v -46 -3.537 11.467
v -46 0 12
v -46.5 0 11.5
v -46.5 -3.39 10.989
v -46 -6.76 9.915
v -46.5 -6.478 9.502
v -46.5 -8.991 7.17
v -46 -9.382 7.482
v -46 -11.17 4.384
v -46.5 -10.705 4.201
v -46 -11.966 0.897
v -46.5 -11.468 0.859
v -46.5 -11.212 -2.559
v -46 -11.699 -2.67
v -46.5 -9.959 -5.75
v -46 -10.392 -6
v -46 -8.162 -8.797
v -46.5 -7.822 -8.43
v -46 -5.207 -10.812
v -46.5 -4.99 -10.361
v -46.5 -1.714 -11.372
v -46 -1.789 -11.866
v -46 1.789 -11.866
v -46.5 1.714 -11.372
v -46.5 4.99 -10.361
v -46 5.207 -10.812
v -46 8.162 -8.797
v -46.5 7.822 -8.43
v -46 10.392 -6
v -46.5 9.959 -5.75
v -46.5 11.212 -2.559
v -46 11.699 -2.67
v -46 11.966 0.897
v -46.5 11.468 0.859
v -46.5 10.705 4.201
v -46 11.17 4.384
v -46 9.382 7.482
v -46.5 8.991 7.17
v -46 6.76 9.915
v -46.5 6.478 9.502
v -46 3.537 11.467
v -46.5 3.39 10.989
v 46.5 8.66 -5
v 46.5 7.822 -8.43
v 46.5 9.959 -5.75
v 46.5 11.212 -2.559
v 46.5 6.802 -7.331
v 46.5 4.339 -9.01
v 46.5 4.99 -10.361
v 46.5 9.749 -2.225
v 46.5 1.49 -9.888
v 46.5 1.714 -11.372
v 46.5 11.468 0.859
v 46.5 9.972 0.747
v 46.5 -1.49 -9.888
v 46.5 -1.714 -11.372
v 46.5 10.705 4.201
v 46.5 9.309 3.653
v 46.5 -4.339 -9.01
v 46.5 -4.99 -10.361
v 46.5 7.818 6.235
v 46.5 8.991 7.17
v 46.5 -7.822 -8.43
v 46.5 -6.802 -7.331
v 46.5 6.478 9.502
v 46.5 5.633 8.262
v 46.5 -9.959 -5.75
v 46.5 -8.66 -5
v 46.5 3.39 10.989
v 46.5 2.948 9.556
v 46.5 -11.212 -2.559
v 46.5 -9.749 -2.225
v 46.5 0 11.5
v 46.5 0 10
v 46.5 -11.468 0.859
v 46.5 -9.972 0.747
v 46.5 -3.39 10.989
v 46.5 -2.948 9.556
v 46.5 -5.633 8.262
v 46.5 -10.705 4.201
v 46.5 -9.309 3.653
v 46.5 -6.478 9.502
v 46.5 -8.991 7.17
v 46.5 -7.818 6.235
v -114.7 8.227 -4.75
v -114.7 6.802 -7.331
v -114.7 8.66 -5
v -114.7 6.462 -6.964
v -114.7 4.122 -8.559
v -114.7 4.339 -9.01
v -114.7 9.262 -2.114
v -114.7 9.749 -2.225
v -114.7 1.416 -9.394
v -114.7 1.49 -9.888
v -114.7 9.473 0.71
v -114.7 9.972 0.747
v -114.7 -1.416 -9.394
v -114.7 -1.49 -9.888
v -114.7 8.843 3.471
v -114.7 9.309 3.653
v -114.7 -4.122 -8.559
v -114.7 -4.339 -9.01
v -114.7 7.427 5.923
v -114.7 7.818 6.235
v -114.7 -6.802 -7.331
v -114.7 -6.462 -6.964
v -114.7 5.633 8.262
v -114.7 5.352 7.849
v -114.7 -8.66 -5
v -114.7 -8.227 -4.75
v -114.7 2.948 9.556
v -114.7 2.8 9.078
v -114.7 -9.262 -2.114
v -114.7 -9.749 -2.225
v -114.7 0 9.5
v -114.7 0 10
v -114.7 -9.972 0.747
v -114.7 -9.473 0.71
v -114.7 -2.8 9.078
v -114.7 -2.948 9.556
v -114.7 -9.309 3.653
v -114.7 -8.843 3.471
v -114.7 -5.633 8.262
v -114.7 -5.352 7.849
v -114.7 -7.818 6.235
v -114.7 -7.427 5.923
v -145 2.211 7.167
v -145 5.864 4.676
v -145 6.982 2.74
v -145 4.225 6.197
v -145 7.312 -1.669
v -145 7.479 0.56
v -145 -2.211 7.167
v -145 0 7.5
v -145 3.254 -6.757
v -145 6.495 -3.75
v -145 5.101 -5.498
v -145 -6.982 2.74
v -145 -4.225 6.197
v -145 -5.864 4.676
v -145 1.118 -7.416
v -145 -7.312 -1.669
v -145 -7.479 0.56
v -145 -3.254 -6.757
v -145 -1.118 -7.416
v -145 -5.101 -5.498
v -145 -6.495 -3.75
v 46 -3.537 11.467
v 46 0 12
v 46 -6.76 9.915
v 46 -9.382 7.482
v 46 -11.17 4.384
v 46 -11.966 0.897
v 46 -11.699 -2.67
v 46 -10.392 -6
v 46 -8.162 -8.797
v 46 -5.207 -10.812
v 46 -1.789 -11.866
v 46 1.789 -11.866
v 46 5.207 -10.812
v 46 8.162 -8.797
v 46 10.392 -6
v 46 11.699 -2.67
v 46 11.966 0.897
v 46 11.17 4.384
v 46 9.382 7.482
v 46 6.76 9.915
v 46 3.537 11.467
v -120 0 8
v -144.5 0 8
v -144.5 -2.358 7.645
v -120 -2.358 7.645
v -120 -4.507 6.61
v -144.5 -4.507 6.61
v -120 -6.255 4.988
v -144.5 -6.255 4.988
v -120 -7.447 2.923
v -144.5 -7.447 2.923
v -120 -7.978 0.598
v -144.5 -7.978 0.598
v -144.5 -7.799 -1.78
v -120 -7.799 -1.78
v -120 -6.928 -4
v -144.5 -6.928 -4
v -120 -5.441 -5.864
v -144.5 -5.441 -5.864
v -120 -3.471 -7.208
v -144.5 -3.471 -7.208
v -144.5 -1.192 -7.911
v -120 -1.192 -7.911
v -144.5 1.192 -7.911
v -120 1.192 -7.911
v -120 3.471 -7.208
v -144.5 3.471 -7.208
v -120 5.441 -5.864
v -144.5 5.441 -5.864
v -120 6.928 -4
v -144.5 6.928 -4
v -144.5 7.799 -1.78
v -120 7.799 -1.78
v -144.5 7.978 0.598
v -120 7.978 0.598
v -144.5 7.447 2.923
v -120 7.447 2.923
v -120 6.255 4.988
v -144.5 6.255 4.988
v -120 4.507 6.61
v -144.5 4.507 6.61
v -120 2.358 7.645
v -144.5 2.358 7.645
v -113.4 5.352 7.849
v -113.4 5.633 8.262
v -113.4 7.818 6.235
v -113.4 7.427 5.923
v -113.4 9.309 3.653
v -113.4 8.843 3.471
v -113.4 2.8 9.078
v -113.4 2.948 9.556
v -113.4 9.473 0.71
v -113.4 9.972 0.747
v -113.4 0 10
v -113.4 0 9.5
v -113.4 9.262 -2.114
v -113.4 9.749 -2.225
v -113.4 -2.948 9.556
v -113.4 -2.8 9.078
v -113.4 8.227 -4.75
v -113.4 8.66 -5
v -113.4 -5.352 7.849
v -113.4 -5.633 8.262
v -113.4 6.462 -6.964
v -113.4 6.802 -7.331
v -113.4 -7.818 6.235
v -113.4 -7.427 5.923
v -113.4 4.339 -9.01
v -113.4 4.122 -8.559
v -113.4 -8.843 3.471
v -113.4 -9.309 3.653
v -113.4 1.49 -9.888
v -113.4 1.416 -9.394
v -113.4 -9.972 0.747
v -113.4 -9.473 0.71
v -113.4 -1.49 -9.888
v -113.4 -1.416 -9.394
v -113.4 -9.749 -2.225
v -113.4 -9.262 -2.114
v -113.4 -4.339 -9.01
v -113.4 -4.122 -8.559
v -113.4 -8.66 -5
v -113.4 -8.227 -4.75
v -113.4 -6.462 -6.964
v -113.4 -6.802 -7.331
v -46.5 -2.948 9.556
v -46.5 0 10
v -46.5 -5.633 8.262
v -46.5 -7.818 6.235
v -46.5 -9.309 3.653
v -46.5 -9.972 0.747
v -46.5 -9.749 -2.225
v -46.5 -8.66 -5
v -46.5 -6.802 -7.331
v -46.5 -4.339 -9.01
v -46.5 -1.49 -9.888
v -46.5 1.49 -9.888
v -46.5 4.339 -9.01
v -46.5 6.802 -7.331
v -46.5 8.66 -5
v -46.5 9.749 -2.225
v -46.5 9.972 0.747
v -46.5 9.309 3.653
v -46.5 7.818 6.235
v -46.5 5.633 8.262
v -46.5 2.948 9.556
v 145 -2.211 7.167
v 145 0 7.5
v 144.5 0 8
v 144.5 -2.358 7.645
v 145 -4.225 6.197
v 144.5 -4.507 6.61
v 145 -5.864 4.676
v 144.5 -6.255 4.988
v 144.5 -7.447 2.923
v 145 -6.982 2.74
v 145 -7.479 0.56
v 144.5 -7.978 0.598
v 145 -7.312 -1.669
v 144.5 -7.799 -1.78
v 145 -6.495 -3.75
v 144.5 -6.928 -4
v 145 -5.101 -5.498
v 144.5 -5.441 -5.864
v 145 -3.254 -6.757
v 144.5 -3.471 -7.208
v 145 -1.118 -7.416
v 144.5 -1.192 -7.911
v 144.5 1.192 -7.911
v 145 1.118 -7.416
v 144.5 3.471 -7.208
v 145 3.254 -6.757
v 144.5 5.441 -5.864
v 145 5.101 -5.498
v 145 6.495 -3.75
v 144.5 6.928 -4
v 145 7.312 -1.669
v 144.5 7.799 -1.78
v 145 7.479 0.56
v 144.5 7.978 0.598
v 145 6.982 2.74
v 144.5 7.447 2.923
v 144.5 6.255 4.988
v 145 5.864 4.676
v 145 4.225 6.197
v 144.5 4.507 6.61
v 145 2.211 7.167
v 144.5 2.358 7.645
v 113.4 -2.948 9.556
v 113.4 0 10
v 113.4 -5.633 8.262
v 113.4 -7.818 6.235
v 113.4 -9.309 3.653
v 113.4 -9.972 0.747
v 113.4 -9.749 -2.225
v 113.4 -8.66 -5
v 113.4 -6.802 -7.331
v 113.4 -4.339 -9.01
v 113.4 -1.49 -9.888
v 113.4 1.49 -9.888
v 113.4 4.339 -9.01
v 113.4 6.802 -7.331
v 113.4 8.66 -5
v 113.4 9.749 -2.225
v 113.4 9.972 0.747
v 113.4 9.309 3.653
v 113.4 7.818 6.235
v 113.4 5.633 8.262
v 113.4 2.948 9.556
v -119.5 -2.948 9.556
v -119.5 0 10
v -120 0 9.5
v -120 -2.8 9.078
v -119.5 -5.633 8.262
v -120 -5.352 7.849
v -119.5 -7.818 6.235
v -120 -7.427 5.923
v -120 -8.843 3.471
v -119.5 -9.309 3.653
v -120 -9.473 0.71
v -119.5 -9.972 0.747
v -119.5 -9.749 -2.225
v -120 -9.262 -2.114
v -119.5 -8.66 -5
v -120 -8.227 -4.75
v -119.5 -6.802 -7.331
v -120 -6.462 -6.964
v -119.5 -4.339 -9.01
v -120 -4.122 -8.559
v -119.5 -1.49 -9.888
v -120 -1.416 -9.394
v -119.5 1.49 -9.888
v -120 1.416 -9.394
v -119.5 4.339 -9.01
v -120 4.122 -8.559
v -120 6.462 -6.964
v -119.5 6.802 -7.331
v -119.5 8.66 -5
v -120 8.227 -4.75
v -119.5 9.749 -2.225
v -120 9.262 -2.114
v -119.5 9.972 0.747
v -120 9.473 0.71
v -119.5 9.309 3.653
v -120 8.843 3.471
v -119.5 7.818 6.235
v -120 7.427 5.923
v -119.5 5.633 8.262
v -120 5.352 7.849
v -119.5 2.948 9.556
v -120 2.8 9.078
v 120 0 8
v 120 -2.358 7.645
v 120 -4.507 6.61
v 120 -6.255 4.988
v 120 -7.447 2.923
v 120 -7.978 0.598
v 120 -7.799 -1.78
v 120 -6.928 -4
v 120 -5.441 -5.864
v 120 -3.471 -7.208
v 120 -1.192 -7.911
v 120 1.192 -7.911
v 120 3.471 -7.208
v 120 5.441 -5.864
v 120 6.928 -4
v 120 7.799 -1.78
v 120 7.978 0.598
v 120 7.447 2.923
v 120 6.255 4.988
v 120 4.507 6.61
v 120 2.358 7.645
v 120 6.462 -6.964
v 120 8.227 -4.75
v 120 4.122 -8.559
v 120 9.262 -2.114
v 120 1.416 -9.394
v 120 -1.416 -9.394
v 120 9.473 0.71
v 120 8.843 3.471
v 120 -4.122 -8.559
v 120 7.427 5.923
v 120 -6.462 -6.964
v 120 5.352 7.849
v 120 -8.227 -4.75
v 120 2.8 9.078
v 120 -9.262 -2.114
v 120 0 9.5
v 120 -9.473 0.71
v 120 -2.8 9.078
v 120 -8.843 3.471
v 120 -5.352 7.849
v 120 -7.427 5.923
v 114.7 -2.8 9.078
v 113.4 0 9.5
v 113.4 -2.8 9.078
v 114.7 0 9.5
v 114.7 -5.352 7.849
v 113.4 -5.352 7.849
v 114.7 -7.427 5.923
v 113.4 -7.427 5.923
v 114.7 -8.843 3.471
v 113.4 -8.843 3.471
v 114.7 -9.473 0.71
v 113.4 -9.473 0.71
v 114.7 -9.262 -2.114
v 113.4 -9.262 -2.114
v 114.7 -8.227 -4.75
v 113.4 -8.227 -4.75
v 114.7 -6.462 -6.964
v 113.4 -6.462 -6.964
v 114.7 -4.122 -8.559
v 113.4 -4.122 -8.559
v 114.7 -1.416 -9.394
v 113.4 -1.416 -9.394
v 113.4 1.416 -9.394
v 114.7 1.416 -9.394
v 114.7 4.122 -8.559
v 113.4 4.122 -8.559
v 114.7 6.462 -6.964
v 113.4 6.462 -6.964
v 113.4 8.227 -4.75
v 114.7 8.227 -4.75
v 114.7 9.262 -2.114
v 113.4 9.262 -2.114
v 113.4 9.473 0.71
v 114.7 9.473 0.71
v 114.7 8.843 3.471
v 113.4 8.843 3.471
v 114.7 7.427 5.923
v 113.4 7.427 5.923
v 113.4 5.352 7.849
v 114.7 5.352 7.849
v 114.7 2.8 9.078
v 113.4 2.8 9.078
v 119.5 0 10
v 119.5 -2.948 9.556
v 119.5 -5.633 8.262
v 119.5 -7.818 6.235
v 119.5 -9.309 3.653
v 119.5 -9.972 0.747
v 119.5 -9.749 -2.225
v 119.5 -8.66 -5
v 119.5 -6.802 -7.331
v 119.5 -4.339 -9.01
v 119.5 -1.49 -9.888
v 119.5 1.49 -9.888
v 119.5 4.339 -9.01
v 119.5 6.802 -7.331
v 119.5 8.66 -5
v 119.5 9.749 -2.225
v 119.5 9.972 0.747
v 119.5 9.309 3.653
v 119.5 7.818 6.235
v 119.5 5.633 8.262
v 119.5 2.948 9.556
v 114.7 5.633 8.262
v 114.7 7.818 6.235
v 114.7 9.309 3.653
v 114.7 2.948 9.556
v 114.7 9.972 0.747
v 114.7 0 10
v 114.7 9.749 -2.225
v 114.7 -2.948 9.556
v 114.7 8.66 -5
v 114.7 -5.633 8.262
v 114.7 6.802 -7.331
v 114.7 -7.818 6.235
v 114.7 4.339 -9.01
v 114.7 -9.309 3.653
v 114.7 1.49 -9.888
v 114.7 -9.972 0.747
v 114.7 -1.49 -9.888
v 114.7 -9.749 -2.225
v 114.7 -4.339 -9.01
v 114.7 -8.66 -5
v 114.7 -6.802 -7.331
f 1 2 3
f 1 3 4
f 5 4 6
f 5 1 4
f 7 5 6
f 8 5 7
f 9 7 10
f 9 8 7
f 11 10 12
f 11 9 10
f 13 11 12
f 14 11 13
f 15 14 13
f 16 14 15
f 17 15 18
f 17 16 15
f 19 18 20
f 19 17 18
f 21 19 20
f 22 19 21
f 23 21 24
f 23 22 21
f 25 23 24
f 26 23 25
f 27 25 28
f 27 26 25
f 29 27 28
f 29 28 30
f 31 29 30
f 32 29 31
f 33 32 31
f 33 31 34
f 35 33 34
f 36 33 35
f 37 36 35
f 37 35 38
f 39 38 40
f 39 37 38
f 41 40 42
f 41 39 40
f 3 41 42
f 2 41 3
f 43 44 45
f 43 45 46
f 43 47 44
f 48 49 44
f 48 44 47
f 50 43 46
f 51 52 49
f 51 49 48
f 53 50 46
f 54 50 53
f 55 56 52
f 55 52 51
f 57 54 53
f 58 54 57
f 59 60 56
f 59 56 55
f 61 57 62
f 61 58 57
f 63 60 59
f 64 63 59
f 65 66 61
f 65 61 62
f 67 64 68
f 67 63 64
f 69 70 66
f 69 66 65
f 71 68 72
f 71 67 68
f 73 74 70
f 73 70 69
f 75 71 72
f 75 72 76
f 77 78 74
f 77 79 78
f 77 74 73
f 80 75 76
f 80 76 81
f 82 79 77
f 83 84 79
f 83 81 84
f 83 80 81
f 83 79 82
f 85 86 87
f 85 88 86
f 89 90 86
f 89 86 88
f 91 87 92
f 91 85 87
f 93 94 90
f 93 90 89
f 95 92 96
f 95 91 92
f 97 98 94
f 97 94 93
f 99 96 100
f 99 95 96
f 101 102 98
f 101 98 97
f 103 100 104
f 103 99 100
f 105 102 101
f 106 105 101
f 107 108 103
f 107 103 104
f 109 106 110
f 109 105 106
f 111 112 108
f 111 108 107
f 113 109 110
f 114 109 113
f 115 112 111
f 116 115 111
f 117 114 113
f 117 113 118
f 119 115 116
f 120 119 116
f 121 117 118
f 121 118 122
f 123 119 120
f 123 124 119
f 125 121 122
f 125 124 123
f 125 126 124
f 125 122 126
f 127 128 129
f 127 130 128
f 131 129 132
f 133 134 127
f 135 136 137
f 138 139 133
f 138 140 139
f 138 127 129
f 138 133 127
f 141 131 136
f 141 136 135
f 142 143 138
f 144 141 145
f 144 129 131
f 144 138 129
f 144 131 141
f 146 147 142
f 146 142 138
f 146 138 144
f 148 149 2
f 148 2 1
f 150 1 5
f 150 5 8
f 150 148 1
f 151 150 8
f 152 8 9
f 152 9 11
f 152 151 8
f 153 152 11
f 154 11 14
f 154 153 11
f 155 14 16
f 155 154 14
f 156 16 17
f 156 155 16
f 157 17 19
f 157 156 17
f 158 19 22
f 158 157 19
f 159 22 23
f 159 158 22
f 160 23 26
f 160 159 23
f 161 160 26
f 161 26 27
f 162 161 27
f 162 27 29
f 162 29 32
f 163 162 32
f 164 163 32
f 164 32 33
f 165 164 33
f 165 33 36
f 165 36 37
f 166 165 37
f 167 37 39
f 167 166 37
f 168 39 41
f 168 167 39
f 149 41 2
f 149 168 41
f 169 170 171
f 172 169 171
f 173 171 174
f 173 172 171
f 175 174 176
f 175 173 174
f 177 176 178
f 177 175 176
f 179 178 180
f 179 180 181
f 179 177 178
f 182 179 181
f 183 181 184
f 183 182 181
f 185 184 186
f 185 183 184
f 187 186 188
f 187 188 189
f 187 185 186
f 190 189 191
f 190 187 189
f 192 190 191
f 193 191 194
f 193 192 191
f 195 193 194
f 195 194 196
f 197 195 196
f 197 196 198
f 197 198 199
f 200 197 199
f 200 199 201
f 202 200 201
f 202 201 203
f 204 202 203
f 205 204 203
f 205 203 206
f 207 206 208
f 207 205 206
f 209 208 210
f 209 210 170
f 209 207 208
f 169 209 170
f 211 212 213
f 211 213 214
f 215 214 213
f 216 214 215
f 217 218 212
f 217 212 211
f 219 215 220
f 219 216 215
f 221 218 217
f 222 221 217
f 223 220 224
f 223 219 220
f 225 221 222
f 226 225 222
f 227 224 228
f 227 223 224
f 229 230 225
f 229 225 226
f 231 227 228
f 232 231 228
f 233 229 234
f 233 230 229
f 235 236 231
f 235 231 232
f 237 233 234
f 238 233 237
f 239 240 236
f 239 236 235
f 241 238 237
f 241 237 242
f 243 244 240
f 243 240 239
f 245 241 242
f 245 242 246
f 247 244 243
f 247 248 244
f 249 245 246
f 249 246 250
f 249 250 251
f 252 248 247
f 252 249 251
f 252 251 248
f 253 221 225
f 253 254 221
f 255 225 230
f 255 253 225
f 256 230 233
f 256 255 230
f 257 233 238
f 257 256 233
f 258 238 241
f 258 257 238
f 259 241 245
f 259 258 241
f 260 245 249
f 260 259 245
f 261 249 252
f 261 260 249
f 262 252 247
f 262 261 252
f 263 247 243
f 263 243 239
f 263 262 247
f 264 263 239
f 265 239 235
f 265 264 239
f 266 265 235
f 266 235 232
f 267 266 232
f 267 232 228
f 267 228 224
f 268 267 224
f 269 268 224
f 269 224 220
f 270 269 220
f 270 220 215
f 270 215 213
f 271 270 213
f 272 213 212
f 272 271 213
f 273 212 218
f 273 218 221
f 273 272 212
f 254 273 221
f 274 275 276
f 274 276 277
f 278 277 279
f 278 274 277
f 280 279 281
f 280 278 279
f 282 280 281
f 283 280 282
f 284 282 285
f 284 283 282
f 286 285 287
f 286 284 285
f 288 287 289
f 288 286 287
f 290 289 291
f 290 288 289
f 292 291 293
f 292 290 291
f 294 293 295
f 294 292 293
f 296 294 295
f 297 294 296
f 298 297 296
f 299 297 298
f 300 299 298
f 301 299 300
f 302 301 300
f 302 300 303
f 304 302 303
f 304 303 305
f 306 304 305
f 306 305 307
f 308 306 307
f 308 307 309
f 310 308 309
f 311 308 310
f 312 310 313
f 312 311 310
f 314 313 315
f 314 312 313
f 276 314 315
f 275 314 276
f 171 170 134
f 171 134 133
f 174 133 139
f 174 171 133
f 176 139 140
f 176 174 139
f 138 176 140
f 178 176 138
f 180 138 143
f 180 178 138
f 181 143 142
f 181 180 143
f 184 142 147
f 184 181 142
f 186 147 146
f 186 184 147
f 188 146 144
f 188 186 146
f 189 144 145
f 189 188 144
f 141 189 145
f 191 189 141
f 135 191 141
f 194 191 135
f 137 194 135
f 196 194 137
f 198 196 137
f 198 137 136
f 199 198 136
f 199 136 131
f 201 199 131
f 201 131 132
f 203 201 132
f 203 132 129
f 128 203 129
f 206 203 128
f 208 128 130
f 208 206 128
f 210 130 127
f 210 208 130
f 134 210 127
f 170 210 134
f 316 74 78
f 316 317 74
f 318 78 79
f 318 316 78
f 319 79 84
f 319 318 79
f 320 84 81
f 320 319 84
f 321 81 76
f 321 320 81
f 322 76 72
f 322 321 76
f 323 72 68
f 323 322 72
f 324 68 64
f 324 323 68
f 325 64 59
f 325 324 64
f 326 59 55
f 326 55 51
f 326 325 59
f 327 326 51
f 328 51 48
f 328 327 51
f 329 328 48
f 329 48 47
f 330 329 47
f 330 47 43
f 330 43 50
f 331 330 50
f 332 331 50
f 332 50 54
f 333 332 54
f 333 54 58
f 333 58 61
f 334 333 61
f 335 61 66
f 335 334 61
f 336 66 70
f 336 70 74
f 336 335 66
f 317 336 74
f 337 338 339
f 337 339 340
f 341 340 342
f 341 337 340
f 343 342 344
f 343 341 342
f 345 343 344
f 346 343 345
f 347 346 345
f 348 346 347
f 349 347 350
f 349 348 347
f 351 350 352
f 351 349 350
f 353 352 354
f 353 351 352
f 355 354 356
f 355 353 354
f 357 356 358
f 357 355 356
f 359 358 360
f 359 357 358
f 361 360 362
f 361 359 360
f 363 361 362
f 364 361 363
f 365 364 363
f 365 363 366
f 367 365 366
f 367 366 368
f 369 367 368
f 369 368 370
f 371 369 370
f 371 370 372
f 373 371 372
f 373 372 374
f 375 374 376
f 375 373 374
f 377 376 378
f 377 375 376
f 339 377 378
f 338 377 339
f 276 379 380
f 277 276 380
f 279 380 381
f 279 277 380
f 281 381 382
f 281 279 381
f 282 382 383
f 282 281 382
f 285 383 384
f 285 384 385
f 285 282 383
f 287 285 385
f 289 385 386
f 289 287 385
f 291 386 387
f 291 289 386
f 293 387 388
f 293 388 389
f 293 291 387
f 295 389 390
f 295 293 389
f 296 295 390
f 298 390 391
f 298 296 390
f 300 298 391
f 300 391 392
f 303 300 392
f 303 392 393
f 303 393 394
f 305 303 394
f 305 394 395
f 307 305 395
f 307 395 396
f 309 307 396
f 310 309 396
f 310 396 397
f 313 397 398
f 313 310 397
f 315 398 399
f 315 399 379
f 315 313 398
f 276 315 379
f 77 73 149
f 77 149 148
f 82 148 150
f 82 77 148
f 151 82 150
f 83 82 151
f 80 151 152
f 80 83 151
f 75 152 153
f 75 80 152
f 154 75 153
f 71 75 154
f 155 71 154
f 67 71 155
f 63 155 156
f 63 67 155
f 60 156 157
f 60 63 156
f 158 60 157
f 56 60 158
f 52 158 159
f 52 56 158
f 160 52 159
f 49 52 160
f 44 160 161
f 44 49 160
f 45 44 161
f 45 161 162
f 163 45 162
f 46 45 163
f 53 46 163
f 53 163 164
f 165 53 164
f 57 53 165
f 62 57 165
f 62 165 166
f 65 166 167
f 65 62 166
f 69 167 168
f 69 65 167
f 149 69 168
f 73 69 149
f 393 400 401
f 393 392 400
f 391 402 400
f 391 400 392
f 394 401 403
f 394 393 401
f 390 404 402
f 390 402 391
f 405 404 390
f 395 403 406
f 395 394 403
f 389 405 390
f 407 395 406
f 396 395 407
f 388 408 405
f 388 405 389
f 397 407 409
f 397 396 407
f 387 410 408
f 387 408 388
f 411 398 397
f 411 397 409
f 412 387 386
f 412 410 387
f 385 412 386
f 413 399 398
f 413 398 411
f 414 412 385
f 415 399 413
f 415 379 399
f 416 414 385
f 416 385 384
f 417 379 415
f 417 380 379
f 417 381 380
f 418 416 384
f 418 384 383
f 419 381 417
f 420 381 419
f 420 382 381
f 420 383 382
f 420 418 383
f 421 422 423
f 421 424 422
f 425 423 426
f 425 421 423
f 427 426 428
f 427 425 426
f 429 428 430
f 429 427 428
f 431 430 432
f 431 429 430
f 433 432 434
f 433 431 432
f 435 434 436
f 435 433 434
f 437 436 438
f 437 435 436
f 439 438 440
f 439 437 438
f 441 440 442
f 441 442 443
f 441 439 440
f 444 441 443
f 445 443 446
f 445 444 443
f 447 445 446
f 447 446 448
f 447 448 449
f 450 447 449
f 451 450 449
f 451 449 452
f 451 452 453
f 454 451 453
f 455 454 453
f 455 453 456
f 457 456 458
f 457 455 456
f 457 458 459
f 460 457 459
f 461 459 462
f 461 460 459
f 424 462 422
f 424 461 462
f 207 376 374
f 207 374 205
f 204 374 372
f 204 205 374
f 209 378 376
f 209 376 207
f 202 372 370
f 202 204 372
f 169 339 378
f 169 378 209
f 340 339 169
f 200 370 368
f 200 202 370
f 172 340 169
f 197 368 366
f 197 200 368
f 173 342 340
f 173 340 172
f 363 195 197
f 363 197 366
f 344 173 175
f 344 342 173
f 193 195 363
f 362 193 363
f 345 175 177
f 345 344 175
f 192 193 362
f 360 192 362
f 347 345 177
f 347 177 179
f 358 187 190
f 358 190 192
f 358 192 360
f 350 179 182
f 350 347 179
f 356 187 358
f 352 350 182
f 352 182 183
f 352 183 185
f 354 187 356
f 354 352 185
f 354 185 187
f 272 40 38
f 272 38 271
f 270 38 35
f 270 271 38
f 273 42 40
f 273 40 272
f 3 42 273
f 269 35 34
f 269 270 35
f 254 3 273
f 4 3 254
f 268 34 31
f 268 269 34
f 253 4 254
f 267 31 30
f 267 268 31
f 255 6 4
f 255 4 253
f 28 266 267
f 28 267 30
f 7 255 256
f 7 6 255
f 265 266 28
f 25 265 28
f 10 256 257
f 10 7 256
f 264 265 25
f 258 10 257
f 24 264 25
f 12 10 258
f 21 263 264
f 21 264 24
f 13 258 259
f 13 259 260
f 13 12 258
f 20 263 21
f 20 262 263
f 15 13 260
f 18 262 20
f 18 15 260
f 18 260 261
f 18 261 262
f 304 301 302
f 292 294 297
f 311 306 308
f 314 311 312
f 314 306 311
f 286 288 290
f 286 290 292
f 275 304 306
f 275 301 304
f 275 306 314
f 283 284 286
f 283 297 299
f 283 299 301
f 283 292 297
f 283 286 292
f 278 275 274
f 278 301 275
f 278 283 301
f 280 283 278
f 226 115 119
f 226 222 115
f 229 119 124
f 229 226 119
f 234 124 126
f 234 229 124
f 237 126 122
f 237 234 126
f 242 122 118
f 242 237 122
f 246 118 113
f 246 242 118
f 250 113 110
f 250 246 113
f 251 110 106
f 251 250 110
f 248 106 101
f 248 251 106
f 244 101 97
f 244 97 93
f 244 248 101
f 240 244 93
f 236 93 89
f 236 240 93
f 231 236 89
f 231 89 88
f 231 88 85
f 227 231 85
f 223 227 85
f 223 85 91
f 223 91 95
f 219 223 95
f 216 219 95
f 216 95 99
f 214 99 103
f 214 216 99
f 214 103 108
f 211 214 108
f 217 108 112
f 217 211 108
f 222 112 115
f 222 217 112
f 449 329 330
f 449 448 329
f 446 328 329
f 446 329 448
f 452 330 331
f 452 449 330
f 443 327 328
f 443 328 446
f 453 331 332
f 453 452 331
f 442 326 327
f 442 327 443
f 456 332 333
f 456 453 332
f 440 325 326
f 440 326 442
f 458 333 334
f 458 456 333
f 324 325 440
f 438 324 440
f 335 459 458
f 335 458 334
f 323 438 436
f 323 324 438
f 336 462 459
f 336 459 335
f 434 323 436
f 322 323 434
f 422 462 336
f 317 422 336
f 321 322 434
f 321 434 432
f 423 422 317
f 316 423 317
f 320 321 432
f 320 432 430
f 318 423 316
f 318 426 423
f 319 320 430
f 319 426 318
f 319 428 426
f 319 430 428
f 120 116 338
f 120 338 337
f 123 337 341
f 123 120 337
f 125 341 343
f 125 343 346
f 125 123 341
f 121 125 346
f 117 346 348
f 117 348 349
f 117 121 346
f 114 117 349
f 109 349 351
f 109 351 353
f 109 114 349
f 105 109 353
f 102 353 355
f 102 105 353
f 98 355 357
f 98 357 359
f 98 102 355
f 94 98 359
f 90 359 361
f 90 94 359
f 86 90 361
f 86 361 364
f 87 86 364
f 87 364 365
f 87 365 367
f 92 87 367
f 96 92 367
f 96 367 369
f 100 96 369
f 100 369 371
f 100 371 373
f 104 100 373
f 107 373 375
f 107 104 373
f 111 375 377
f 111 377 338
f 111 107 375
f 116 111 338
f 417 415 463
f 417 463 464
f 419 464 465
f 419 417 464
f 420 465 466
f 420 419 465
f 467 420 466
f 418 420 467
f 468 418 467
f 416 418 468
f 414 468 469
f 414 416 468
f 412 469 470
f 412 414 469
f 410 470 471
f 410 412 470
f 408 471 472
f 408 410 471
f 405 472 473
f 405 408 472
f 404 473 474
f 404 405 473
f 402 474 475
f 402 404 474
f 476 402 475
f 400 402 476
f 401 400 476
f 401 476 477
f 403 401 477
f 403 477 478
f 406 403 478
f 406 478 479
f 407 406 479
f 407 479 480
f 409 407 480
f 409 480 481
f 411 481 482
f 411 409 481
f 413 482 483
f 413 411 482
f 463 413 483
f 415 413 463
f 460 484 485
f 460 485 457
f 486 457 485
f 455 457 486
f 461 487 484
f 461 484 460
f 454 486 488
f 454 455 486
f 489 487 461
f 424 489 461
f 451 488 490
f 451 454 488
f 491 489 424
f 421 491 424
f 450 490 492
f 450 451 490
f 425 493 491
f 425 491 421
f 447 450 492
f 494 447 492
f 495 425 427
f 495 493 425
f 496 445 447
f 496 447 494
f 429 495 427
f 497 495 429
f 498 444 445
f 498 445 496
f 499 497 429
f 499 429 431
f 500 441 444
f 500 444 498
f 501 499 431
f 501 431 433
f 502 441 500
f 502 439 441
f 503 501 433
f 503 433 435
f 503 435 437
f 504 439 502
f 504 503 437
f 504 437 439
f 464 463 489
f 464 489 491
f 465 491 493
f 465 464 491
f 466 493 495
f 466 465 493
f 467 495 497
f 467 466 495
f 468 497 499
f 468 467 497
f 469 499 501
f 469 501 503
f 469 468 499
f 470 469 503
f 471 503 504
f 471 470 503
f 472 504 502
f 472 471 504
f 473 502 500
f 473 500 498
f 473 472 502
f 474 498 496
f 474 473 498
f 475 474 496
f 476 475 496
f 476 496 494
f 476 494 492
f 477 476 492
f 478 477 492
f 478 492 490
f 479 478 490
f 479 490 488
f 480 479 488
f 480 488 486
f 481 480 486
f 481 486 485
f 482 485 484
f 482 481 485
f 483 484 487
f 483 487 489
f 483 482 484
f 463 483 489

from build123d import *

# Parameters (mm, degrees)
CHAMFER1_SIZE = 0.5


with BuildPart() as part:
    # Sketch1 → Revolve1 (revolve)
    with BuildSketch(Plane(origin=(0, 0, 0), x_dir=(1, 0, 0), z_dir=(0, 1, 0)), mode=Mode.PRIVATE) as revolve1_sk:
        Polygon((-145, 0), (-145, 8), (-120, 8), (-120, 10), (-114.7, 10), (-114.7, 9.5), (-113.4, 9.5), (-113.4, 10), (-46.5, 10), (-46.5, 12), (46.5, 12), (46.5, 10), (113.4, 10), (113.4, 9.5), (114.7, 9.5), (114.7, 10), (120, 10), (120, 8), (145, 8), (145, 0), align=None)
    revolve(revolve1_sk.sketch.rotate(Axis((-145, 0, 0), (1, 0, 0)), 180), axis=Axis((-145, 0, 0), (1, 0, 0)))

    # Chamfer1
    chamfer1_edges = [part.edges().sort_by_distance(p)[0] for p in [
        (-145, 0, -8),
        (-120, 0, -10),
        (-46.5, 0, -12),
        (46.5, 0, -12),
        (120, 0, -10),
        (145, 0, -8),
    ]]
    chamfer(chamfer1_edges, length=CHAMFER1_SIZE)


solid = part.part
